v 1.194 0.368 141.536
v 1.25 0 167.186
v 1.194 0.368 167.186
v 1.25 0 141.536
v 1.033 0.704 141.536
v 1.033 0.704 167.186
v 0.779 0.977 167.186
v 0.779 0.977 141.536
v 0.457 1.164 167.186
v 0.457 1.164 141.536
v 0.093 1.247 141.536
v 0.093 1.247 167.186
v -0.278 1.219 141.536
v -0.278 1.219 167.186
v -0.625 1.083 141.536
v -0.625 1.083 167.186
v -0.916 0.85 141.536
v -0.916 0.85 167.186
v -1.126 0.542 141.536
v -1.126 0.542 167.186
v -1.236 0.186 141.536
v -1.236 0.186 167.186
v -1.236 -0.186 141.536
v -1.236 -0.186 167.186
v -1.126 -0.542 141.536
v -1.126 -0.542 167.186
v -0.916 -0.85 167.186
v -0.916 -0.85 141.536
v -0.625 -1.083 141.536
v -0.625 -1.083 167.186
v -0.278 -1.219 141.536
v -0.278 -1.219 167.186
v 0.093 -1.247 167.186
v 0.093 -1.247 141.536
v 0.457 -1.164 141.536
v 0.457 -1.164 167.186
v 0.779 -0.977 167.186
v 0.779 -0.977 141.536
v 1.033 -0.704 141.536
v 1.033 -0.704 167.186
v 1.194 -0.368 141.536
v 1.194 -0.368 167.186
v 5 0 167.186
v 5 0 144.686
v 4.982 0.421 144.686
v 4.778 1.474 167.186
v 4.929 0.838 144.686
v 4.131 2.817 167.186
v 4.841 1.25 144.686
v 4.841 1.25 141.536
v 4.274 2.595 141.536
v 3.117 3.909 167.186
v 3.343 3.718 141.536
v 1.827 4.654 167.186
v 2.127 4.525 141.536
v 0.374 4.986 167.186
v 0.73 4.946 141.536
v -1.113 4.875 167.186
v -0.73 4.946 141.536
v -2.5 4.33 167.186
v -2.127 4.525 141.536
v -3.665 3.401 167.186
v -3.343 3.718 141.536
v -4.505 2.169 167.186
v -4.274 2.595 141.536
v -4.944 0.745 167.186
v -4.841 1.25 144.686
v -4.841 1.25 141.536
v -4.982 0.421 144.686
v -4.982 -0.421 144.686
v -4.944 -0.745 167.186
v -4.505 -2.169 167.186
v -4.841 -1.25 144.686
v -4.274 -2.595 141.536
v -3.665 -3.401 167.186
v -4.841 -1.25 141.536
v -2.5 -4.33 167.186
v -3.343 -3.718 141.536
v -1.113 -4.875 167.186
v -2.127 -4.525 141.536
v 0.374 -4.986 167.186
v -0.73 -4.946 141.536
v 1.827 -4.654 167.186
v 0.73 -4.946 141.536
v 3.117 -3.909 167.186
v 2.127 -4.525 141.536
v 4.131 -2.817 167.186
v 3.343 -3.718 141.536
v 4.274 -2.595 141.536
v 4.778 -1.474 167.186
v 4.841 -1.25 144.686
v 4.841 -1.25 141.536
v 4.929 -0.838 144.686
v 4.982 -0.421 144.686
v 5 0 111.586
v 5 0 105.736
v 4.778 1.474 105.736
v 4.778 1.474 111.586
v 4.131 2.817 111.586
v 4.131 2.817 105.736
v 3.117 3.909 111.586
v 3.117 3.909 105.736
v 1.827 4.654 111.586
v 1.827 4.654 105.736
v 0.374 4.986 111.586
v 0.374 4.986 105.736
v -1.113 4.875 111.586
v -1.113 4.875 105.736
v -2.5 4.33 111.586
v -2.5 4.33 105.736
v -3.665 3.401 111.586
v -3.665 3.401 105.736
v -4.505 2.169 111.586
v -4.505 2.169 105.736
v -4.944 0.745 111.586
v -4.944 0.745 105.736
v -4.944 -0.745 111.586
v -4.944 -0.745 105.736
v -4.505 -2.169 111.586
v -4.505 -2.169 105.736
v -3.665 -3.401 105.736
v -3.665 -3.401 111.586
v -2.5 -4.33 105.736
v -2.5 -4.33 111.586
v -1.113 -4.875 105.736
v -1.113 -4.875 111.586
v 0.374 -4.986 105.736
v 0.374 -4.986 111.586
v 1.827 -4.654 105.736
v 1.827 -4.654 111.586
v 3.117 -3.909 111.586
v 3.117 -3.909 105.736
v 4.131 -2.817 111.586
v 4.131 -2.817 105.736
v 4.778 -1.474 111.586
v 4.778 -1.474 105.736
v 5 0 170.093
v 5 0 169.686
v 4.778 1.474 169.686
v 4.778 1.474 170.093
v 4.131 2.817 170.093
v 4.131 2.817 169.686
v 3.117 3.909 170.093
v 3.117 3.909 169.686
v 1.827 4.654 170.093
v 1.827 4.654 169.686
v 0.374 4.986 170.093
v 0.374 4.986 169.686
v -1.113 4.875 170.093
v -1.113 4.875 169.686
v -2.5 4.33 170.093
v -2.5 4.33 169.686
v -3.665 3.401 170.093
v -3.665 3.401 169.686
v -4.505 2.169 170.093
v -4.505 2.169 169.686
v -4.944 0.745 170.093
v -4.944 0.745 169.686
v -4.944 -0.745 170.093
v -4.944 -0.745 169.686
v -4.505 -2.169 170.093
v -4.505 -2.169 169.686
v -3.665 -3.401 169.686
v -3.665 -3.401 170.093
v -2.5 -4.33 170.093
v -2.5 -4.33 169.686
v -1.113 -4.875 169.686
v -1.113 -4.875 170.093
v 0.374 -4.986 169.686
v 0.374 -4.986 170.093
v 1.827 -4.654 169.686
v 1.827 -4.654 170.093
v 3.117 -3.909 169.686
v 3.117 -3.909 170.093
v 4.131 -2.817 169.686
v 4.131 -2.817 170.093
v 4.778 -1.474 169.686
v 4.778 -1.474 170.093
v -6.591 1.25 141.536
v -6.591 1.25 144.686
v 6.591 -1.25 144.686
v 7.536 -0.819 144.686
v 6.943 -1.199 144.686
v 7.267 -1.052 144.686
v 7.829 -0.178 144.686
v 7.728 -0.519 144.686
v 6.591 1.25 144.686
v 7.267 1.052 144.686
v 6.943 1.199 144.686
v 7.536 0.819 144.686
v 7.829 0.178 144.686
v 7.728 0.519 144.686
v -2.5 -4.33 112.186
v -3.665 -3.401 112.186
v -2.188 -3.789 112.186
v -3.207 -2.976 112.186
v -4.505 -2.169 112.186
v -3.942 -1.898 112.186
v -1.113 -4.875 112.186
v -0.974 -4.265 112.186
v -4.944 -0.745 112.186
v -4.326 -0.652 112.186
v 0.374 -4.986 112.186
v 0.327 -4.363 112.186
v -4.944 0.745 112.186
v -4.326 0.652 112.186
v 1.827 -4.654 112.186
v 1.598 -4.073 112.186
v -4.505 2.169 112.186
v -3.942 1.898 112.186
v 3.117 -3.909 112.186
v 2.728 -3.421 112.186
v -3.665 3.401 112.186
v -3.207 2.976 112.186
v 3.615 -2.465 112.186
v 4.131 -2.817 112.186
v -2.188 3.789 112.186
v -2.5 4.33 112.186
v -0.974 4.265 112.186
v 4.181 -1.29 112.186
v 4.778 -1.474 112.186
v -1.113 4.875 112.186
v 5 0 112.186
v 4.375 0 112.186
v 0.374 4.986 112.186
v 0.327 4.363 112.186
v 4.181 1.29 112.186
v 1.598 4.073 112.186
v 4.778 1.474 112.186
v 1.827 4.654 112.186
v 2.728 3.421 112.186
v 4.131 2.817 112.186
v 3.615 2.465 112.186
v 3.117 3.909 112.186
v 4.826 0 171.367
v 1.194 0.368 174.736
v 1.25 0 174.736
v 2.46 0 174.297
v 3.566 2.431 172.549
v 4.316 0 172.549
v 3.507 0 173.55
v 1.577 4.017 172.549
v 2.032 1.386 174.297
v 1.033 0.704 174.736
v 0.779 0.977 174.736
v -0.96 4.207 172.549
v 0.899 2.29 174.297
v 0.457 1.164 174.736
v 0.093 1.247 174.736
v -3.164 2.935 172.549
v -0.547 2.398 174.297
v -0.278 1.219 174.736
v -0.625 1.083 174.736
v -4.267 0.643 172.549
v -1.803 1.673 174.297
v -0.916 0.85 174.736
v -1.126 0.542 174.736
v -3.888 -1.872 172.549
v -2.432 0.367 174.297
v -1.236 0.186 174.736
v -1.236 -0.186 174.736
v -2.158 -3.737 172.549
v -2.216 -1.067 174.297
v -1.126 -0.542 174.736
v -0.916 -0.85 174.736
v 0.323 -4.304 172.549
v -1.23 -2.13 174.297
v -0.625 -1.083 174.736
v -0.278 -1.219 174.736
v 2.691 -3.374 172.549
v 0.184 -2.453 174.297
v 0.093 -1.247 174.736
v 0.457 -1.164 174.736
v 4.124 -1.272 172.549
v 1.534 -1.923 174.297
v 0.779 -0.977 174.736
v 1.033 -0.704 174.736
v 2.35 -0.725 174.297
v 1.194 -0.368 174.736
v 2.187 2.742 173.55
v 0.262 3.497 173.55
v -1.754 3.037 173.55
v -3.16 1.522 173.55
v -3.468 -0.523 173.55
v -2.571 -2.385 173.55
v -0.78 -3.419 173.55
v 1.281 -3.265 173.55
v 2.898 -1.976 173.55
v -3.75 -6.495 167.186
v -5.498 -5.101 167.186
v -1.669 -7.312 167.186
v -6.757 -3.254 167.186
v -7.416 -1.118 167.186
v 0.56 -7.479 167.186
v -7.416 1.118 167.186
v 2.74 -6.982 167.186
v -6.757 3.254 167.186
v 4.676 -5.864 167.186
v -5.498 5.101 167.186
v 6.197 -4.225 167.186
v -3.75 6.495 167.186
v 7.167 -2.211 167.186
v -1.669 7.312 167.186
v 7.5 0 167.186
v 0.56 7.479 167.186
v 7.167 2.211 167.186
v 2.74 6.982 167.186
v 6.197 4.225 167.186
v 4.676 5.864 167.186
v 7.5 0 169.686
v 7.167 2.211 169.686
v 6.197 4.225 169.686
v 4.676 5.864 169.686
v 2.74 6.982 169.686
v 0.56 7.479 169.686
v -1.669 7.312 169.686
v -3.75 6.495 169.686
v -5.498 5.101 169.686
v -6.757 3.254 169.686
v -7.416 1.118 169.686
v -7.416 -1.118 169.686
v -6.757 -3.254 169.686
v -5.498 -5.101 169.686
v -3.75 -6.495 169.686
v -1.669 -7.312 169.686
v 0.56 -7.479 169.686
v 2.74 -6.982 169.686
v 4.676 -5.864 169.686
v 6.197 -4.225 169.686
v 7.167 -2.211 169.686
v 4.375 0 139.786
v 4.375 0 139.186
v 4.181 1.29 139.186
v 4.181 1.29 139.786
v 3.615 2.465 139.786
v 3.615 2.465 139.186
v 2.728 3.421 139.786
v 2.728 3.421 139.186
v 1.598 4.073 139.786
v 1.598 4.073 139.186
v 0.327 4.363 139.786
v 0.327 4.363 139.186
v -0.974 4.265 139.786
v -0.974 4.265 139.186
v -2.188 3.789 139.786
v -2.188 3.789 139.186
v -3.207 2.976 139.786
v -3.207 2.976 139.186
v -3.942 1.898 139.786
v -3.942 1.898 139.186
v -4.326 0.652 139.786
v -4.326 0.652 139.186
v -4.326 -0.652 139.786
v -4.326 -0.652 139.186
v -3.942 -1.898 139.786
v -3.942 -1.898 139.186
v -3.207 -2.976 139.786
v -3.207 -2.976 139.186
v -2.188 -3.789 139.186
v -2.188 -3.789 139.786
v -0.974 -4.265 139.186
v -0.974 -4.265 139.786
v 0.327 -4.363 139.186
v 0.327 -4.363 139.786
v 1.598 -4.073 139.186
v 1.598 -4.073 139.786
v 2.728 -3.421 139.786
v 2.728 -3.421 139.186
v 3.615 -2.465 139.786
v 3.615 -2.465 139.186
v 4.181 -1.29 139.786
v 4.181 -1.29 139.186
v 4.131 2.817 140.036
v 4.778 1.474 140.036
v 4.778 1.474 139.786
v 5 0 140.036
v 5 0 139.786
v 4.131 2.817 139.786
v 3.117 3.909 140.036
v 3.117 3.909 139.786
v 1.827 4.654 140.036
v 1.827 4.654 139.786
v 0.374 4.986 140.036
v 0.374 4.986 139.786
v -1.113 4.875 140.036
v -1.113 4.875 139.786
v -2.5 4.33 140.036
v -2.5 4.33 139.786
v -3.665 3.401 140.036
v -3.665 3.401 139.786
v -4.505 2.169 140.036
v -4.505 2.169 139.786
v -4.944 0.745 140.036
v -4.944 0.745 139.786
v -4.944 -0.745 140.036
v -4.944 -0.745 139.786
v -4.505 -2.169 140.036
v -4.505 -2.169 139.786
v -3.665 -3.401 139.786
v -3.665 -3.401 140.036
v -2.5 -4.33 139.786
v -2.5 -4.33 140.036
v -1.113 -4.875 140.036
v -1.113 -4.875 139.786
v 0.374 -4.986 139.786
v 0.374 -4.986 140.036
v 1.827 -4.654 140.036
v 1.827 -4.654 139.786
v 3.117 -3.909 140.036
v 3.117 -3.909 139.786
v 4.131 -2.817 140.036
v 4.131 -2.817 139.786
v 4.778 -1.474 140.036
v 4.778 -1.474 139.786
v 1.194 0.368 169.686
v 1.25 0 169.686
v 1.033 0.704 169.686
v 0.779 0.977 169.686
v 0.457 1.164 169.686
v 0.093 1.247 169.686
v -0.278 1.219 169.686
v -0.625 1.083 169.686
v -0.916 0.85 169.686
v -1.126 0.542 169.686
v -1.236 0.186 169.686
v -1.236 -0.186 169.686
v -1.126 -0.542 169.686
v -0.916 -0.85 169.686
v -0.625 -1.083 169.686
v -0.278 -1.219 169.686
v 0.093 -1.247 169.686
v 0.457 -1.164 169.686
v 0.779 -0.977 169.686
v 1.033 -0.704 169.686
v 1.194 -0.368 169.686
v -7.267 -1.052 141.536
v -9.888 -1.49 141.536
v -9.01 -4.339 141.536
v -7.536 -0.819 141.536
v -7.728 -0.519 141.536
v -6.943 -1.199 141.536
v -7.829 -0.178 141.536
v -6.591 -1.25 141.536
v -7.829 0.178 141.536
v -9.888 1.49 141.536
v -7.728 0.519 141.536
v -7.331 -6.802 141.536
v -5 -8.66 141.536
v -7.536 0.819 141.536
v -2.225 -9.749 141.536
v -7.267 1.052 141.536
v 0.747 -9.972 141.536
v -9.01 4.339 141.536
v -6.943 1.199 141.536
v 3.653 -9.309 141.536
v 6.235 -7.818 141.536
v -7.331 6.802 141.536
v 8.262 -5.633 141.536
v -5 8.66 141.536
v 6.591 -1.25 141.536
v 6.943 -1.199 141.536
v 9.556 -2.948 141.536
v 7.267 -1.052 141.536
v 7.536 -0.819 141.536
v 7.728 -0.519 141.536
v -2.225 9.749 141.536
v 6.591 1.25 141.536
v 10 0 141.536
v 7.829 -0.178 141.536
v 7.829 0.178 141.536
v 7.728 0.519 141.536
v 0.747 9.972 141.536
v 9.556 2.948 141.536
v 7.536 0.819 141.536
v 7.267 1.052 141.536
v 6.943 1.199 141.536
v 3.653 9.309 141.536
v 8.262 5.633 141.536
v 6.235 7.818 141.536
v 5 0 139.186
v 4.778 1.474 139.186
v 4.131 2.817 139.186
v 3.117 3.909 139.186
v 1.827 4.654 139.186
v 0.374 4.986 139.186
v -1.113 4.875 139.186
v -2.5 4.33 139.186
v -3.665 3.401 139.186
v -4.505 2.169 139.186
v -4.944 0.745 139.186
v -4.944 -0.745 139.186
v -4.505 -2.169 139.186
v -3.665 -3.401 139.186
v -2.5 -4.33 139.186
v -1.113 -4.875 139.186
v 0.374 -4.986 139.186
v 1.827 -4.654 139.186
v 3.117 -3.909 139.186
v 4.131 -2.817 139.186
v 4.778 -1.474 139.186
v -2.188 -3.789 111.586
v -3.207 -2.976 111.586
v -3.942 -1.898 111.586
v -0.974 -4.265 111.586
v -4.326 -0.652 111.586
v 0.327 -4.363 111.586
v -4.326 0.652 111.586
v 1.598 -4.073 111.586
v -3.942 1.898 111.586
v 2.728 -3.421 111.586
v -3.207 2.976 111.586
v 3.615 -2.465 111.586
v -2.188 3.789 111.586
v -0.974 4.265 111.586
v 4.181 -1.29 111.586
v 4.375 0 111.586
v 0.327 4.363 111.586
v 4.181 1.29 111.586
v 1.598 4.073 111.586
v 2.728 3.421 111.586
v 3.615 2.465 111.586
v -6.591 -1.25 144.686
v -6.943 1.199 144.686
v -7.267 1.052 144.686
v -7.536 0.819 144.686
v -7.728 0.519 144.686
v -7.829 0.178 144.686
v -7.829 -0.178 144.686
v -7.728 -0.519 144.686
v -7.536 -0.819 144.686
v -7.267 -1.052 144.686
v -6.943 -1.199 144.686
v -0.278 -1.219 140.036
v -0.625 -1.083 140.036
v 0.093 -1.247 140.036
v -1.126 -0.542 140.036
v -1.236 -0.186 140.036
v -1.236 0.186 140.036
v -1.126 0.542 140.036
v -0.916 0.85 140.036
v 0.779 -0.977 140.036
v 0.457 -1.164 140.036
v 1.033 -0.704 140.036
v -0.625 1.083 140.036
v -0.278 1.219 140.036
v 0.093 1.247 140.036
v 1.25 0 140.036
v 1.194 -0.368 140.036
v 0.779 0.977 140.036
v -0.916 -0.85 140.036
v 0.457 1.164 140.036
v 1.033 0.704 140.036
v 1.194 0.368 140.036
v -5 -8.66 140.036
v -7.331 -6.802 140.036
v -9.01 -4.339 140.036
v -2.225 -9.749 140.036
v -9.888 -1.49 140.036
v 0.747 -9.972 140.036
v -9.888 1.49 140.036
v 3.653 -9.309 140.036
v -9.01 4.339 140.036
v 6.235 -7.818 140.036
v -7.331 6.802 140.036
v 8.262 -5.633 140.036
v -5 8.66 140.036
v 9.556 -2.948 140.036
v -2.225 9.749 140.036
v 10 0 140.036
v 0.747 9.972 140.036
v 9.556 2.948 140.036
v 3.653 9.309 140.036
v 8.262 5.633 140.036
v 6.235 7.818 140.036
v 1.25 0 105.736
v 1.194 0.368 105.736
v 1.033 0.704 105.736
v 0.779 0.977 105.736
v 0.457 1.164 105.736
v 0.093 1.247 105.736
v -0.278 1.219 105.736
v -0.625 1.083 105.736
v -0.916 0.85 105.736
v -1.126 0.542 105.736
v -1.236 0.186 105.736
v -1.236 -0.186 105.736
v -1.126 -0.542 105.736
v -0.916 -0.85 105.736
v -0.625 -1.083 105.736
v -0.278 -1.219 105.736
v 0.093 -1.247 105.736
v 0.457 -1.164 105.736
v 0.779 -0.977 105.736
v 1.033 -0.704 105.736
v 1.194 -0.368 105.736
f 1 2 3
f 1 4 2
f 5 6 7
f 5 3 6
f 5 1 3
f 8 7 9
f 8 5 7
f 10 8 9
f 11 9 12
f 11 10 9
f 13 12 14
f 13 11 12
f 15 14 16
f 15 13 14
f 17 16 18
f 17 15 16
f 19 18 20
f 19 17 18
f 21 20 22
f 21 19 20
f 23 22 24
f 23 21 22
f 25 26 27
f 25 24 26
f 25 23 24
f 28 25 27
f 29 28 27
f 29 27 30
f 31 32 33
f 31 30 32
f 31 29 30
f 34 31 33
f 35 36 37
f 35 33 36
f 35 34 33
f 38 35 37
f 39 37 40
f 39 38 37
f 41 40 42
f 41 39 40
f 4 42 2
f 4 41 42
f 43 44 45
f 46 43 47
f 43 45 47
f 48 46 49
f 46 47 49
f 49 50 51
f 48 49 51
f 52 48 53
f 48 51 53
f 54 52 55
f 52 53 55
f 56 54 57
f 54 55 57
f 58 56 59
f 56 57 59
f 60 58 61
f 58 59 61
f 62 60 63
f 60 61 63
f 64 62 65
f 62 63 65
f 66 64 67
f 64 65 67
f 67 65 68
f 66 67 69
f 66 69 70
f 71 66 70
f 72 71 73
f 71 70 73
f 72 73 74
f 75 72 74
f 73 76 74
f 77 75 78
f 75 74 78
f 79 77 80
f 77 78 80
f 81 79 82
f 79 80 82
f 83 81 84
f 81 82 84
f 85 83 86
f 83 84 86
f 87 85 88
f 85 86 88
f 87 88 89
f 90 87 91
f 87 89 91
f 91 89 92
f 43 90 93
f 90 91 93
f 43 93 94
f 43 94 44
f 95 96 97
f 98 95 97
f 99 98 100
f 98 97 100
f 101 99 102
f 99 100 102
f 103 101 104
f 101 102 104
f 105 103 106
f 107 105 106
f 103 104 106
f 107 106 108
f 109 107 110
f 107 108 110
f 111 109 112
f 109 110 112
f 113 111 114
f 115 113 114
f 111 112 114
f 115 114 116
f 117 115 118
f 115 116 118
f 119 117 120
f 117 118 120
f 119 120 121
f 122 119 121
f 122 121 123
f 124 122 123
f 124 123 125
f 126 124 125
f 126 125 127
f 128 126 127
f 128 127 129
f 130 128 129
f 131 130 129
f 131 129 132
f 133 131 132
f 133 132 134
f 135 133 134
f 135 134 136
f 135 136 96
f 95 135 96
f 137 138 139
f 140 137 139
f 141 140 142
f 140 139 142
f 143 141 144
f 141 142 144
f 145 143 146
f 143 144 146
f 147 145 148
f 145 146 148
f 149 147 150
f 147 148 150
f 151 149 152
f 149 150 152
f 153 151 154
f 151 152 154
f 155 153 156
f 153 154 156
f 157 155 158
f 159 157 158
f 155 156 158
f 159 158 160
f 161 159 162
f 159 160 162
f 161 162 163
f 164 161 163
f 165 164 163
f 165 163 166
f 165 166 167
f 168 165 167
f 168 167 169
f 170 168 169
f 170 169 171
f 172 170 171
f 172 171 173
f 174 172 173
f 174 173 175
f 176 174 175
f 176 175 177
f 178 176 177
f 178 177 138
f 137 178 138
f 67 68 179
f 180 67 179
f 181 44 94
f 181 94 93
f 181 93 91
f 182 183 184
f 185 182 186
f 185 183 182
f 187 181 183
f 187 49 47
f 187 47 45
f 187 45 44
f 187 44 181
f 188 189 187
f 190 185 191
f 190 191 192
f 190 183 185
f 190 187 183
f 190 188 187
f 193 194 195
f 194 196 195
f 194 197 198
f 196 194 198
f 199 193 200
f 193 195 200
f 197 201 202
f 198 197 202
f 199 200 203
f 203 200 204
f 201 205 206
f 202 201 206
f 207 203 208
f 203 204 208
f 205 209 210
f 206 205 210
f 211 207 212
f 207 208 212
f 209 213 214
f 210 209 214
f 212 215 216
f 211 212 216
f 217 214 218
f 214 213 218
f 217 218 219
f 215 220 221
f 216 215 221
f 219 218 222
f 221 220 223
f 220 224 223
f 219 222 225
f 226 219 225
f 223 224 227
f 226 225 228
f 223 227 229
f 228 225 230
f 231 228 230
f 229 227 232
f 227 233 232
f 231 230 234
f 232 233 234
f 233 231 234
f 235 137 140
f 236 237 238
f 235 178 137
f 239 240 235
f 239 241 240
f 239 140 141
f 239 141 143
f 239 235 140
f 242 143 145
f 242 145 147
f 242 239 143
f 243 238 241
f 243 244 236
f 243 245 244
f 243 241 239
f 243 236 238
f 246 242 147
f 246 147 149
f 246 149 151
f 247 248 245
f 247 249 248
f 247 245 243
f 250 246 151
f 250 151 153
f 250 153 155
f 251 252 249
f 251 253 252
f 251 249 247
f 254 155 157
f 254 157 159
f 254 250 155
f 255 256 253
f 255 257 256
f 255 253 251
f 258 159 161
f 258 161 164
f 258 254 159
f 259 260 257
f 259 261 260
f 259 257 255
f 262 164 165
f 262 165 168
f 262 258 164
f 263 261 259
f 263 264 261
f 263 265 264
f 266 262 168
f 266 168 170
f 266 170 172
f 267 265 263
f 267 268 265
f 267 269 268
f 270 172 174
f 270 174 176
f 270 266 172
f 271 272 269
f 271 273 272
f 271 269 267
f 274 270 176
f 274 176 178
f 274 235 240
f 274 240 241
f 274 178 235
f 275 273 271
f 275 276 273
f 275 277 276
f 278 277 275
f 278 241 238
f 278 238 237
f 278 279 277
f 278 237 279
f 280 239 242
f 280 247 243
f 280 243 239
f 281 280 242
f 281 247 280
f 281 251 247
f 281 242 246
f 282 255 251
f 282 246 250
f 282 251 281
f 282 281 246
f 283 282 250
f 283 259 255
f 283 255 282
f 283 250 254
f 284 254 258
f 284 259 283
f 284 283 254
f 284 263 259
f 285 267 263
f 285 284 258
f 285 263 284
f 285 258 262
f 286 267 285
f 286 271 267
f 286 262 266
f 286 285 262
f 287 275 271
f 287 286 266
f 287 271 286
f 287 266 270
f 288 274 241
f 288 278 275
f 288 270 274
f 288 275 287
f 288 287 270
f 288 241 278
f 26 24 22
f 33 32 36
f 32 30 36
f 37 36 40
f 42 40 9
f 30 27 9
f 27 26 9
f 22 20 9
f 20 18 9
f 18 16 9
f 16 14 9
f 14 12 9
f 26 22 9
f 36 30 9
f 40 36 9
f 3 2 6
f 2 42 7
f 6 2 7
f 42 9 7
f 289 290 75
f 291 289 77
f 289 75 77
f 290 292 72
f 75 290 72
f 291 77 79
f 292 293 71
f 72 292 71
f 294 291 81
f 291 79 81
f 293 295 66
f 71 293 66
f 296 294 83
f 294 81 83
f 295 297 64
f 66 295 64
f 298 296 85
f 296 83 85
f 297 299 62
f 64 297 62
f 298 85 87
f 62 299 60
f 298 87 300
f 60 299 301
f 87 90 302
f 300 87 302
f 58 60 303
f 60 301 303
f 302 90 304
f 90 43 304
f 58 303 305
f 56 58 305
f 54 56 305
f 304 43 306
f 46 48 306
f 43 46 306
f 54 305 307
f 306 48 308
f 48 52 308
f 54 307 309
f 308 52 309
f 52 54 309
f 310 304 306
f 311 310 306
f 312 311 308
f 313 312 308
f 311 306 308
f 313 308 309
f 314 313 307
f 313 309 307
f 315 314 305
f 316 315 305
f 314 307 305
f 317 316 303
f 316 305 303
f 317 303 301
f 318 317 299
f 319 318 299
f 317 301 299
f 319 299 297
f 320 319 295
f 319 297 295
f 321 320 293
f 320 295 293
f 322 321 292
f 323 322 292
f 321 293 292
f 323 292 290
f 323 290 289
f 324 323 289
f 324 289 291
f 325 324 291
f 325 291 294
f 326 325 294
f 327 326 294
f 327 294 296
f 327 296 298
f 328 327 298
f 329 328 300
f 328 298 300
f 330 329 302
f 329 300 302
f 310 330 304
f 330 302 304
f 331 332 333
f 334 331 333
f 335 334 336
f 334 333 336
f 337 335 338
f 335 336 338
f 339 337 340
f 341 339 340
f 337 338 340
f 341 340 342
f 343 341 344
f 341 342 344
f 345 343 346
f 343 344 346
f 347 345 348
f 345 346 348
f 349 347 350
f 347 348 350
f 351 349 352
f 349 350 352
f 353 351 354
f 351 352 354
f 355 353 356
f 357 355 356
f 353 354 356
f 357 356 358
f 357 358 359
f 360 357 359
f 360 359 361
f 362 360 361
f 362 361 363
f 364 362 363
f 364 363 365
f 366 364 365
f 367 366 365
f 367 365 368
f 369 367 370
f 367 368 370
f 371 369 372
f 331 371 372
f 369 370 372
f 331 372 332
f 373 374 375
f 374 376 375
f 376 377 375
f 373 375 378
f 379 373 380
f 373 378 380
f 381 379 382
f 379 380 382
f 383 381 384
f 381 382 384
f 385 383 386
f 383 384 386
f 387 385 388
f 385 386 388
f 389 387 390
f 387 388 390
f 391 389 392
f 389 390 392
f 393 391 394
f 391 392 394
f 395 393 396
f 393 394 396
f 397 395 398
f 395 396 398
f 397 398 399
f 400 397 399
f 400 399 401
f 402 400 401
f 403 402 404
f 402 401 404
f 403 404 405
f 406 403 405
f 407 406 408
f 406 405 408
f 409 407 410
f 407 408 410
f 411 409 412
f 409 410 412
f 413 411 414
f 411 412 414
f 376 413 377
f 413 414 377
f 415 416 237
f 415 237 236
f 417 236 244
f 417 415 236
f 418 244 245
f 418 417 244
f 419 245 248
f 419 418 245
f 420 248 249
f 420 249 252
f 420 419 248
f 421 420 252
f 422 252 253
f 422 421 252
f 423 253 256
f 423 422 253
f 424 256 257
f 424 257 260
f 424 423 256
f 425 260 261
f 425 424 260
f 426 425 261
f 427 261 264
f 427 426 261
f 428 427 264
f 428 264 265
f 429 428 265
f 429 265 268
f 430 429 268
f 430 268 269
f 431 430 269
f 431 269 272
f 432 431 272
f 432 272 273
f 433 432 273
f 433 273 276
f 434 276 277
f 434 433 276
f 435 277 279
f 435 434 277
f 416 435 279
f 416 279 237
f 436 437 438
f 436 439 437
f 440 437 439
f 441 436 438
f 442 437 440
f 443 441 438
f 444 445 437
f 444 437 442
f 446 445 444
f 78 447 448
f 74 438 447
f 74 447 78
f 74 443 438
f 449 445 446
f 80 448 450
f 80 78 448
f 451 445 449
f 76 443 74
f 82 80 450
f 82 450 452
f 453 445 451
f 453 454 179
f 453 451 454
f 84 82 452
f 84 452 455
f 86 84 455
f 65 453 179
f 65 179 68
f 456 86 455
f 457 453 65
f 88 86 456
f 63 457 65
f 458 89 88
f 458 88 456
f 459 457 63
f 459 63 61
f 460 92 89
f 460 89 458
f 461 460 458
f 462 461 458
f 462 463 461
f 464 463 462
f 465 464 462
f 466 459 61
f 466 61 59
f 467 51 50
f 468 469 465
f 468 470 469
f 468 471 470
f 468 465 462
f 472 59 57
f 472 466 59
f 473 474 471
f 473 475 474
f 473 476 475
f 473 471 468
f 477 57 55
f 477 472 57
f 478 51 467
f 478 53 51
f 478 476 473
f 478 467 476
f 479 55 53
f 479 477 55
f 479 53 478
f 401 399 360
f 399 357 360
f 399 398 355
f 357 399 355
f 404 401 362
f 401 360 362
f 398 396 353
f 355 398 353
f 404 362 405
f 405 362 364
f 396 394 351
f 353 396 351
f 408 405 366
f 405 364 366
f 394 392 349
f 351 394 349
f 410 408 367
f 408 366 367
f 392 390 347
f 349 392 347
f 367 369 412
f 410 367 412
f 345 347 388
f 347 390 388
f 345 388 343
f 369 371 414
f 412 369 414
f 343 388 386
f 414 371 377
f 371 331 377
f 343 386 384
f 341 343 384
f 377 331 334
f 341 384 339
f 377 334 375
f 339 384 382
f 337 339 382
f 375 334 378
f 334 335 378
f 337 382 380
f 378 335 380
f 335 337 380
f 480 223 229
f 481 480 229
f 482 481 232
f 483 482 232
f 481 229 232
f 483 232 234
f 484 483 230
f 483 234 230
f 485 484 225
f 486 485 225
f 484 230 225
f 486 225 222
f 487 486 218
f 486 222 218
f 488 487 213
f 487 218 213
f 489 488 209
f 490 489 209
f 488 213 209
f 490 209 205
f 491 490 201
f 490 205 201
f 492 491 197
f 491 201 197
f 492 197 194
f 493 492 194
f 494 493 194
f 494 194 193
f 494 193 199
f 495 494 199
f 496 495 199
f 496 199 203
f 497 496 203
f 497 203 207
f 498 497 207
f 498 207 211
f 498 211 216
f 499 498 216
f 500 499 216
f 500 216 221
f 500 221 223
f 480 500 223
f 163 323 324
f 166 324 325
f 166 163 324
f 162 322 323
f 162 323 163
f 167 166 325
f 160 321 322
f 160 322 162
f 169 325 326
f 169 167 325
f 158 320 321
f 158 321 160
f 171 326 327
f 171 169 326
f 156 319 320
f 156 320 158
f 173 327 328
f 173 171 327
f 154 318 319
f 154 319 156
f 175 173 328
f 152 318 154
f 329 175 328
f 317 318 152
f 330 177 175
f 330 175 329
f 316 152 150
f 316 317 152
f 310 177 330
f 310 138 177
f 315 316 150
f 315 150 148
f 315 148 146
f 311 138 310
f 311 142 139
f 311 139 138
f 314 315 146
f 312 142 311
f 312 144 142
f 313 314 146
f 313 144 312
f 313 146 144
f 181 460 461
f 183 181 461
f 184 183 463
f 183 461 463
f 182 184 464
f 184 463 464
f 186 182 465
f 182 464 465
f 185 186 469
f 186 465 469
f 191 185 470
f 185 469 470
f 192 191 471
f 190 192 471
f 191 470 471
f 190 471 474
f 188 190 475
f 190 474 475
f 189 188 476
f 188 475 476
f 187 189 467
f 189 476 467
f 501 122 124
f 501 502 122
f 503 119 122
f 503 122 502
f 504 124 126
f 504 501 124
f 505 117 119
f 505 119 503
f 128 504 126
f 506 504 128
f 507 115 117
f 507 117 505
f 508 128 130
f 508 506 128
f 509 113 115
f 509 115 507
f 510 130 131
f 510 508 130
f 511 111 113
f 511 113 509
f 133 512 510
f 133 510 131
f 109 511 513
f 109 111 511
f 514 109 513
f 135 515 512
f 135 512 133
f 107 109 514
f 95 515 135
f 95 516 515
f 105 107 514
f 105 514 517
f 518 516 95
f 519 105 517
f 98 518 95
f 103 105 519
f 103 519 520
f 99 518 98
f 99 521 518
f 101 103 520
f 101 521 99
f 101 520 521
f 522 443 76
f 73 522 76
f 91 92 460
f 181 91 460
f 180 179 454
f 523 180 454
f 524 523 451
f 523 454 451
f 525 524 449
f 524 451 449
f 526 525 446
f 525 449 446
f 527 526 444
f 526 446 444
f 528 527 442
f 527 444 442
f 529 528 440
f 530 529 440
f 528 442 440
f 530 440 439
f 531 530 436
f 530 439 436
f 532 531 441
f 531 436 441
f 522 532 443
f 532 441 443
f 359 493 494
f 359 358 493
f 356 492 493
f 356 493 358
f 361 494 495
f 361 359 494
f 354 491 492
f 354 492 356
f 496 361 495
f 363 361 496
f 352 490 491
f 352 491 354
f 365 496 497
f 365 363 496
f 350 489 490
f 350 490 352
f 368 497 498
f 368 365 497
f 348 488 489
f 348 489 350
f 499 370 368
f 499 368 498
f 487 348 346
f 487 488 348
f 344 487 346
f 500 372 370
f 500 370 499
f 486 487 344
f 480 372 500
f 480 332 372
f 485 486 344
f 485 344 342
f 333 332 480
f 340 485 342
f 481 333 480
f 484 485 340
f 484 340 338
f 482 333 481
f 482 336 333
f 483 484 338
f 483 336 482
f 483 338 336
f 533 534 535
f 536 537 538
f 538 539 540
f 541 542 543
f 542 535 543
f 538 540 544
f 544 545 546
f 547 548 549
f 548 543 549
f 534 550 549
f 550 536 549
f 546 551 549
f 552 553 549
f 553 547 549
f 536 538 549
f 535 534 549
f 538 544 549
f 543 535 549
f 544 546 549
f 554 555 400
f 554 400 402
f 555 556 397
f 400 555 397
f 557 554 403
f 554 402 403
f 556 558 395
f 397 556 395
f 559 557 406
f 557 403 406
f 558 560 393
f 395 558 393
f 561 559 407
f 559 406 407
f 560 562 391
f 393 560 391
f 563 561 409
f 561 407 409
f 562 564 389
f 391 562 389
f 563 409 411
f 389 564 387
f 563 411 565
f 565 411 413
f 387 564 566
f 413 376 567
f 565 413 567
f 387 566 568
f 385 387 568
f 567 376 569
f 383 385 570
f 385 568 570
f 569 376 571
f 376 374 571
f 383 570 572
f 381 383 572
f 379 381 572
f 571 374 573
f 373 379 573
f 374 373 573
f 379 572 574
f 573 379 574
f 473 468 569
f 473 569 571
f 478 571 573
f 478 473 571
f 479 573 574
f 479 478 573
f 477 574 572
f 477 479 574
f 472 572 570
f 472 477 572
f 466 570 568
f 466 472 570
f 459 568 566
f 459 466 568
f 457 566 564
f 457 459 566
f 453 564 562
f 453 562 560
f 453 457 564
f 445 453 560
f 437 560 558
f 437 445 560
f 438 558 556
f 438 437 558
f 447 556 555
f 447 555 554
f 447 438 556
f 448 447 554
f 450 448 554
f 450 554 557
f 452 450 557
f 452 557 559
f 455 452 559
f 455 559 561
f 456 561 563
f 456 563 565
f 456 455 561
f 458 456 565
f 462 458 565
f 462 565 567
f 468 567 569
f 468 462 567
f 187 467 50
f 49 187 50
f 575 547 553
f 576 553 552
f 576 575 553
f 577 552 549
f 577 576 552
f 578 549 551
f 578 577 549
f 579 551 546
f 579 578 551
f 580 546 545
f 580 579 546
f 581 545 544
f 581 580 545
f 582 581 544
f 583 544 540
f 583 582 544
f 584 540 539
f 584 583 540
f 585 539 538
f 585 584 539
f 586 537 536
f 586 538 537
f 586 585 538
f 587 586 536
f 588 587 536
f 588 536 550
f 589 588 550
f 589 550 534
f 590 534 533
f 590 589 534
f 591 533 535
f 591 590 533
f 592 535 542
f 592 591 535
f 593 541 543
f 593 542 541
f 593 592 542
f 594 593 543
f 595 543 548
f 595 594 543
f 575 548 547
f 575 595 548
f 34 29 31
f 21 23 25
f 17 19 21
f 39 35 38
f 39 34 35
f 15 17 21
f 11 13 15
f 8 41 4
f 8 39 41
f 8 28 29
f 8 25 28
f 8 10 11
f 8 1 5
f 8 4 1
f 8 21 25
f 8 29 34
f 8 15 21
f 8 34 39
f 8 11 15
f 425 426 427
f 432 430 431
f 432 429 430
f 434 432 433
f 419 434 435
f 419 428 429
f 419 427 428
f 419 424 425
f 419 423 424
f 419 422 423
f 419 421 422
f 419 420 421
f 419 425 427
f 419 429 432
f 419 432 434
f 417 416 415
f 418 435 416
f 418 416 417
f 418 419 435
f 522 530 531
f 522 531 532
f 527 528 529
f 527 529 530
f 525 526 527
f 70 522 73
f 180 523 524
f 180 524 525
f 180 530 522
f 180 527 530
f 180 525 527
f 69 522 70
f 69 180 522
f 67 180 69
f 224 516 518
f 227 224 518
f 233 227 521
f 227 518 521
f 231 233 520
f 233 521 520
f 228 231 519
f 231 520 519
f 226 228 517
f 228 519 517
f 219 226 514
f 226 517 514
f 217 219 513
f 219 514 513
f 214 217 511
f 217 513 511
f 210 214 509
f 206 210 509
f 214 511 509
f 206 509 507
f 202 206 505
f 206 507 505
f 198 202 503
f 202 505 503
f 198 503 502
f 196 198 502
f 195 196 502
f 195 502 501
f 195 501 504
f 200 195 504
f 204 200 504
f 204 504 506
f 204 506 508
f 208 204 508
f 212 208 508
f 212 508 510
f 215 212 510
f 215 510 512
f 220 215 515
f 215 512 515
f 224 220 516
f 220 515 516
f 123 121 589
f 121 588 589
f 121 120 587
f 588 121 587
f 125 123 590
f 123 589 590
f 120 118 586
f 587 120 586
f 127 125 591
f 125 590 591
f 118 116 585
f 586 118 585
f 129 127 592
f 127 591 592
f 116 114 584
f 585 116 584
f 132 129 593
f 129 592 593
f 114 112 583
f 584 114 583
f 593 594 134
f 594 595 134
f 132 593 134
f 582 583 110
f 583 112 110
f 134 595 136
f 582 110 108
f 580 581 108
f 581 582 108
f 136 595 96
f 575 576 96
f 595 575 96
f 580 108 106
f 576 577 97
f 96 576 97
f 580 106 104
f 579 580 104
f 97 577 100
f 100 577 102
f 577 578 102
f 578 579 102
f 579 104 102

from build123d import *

# Parameters (mm, degrees)
SKETCH1_R               = 20
SKETCH1_R_2             = 5
BOSS_EXTRUDE1_DEPTH     = 166
ENL_V_START             = -142.6
ESQUISSE3_R             = 20
ESQUISSE3_R_2           = 17.5
ENL_V_MAT_EXTRU_1_DEPTH = 2.4
ENL_V_START_2           = -32.2
ESQUISSE4_R             = 20
ESQUISSE4_R_2           = 17.5
ENL_V_MAT_EXTRU_2_DEPTH = 2.4
BOSS_EXTRU_1_START      = -22.8
BOSS_EXTRU_1_DEPTH      = 12.6
ESQUISSE6_R             = 20
ESQUISSE6_R_2           = 5
BOSS_EXTRU_2_DEPTH      = 110
BOSS_EXTRU_3_START      = -132.8
ESQUISSE7_R             = 40
BOSS_EXTRU_3_DEPTH      = 6
BOSS_EXTRU_4_START      = -30.2
ESQUISSE8_R             = 30
BOSS_EXTRU_4_DEPTH      = 10
CONG_3_R                = 19
ECHELLE1_SCALE          = 0.25


with BuildPart() as part:
    # Sketch1 → Boss-Extrude1 (new body)
    with BuildSketch(Plane.XY):
        Circle(SKETCH1_R)
        Circle(SKETCH1_R_2, mode=Mode.SUBTRACT)
    extrude(amount=BOSS_EXTRUDE1_DEPTH)

    # Esquisse3 → Enlèv. mat.-Extru.1 (cut)
    with BuildSketch(Plane.XY.offset(166).offset(ENL_V_START)):
        Circle(ESQUISSE3_R)
        Circle(ESQUISSE3_R_2, mode=Mode.SUBTRACT)
    extrude(amount=ENL_V_MAT_EXTRU_1_DEPTH, mode=Mode.SUBTRACT)

    # Esquisse4 → Enlèv. mat.-Extru.2 (cut)
    with BuildSketch(Plane.XY.offset(166).offset(ENL_V_START_2)):
        Circle(ESQUISSE4_R)
        Circle(ESQUISSE4_R_2, mode=Mode.SUBTRACT)
    extrude(amount=ENL_V_MAT_EXTRU_2_DEPTH, mode=Mode.SUBTRACT)

    # Esquisse5 → Boss.-Extru.1 (add)
    with BuildSketch(Plane.XY.offset(166).offset(BOSS_EXTRU_1_START)):
        with BuildLine():
            Line((-19.364916731, 5), (-26.364916731, 5))
            ThreePointArc((-26.364916731, 5), (-31.364916731, 0), (-26.364916731, -5))
            Line((-26.364916731, -5), (-19.364916731, -5))
            ThreePointArc((-19.364916731, -5), (-20, 0), (-19.364916731, 5))
        make_face()
        with BuildLine():
            Line((19.364916731, -5), (26.364916731, -5))
            ThreePointArc((26.364916731, -5), (31.364916731, 0), (26.364916731, 5))
            Line((26.364916731, 5), (19.364916731, 5))
            ThreePointArc((19.364916731, 5), (20, 0), (19.364916731, -5))
        make_face()
    extrude(amount=BOSS_EXTRU_1_DEPTH)

    # Esquisse6 → Boss.-Extru.2 (add)
    with BuildSketch(Plane.XY.offset(166)):
        Circle(ESQUISSE6_R)
        Circle(ESQUISSE6_R_2, mode=Mode.SUBTRACT)
    extrude(amount=BOSS_EXTRU_2_DEPTH)

    # Esquisse7 → Boss.-Extru.3 (add)
    with BuildSketch(Plane.XY.offset(276).offset(BOSS_EXTRU_3_START)):
        Circle(ESQUISSE7_R)
    extrude(amount=-BOSS_EXTRU_3_DEPTH)

    # Esquisse8 → Boss.-Extru.4 (add)
    with BuildSketch(Plane.XY.offset(276).offset(BOSS_EXTRU_4_START)):
        Circle(ESQUISSE8_R)
    extrude(amount=BOSS_EXTRU_4_DEPTH)

    # Congé3
    # the kernel refuses this fillet: 19 mm, written as the material it takes off along each edge
    with BuildSketch(Plane(origin=(0, 0, 276), x_dir=(1, 0, 0), z_dir=(0, -1, 0))) as cong_3_piece_1:
        with BuildLine():
            CenterArc((1, -18.574175621), CONG_3_R, 0, 77.846802531)
            Line((5, 0), (5.08, 0.371483512))
            ThreePointArc((5.08, 0.371483512), (12.5, 0.38), (20, 0.38))
            Line((20, 0.38), (20.38, 0))
            Line((20.38, 0), (20.38, -18.574175621))
            Line((20.38, -18.574175621), (20, -18.574175621))
        make_face()
    revolve(axis=Axis((0, 0, 276), (0, 0, 1)), mode=Mode.SUBTRACT)


with BuildPart() as part_1:
    # Echelle1: scaled about (0, 0, 140.981437802)
    add(part.part.scale(ECHELLE1_SCALE).moved(Location((0, 0, 105.736078351))))


solid = part_1.part
